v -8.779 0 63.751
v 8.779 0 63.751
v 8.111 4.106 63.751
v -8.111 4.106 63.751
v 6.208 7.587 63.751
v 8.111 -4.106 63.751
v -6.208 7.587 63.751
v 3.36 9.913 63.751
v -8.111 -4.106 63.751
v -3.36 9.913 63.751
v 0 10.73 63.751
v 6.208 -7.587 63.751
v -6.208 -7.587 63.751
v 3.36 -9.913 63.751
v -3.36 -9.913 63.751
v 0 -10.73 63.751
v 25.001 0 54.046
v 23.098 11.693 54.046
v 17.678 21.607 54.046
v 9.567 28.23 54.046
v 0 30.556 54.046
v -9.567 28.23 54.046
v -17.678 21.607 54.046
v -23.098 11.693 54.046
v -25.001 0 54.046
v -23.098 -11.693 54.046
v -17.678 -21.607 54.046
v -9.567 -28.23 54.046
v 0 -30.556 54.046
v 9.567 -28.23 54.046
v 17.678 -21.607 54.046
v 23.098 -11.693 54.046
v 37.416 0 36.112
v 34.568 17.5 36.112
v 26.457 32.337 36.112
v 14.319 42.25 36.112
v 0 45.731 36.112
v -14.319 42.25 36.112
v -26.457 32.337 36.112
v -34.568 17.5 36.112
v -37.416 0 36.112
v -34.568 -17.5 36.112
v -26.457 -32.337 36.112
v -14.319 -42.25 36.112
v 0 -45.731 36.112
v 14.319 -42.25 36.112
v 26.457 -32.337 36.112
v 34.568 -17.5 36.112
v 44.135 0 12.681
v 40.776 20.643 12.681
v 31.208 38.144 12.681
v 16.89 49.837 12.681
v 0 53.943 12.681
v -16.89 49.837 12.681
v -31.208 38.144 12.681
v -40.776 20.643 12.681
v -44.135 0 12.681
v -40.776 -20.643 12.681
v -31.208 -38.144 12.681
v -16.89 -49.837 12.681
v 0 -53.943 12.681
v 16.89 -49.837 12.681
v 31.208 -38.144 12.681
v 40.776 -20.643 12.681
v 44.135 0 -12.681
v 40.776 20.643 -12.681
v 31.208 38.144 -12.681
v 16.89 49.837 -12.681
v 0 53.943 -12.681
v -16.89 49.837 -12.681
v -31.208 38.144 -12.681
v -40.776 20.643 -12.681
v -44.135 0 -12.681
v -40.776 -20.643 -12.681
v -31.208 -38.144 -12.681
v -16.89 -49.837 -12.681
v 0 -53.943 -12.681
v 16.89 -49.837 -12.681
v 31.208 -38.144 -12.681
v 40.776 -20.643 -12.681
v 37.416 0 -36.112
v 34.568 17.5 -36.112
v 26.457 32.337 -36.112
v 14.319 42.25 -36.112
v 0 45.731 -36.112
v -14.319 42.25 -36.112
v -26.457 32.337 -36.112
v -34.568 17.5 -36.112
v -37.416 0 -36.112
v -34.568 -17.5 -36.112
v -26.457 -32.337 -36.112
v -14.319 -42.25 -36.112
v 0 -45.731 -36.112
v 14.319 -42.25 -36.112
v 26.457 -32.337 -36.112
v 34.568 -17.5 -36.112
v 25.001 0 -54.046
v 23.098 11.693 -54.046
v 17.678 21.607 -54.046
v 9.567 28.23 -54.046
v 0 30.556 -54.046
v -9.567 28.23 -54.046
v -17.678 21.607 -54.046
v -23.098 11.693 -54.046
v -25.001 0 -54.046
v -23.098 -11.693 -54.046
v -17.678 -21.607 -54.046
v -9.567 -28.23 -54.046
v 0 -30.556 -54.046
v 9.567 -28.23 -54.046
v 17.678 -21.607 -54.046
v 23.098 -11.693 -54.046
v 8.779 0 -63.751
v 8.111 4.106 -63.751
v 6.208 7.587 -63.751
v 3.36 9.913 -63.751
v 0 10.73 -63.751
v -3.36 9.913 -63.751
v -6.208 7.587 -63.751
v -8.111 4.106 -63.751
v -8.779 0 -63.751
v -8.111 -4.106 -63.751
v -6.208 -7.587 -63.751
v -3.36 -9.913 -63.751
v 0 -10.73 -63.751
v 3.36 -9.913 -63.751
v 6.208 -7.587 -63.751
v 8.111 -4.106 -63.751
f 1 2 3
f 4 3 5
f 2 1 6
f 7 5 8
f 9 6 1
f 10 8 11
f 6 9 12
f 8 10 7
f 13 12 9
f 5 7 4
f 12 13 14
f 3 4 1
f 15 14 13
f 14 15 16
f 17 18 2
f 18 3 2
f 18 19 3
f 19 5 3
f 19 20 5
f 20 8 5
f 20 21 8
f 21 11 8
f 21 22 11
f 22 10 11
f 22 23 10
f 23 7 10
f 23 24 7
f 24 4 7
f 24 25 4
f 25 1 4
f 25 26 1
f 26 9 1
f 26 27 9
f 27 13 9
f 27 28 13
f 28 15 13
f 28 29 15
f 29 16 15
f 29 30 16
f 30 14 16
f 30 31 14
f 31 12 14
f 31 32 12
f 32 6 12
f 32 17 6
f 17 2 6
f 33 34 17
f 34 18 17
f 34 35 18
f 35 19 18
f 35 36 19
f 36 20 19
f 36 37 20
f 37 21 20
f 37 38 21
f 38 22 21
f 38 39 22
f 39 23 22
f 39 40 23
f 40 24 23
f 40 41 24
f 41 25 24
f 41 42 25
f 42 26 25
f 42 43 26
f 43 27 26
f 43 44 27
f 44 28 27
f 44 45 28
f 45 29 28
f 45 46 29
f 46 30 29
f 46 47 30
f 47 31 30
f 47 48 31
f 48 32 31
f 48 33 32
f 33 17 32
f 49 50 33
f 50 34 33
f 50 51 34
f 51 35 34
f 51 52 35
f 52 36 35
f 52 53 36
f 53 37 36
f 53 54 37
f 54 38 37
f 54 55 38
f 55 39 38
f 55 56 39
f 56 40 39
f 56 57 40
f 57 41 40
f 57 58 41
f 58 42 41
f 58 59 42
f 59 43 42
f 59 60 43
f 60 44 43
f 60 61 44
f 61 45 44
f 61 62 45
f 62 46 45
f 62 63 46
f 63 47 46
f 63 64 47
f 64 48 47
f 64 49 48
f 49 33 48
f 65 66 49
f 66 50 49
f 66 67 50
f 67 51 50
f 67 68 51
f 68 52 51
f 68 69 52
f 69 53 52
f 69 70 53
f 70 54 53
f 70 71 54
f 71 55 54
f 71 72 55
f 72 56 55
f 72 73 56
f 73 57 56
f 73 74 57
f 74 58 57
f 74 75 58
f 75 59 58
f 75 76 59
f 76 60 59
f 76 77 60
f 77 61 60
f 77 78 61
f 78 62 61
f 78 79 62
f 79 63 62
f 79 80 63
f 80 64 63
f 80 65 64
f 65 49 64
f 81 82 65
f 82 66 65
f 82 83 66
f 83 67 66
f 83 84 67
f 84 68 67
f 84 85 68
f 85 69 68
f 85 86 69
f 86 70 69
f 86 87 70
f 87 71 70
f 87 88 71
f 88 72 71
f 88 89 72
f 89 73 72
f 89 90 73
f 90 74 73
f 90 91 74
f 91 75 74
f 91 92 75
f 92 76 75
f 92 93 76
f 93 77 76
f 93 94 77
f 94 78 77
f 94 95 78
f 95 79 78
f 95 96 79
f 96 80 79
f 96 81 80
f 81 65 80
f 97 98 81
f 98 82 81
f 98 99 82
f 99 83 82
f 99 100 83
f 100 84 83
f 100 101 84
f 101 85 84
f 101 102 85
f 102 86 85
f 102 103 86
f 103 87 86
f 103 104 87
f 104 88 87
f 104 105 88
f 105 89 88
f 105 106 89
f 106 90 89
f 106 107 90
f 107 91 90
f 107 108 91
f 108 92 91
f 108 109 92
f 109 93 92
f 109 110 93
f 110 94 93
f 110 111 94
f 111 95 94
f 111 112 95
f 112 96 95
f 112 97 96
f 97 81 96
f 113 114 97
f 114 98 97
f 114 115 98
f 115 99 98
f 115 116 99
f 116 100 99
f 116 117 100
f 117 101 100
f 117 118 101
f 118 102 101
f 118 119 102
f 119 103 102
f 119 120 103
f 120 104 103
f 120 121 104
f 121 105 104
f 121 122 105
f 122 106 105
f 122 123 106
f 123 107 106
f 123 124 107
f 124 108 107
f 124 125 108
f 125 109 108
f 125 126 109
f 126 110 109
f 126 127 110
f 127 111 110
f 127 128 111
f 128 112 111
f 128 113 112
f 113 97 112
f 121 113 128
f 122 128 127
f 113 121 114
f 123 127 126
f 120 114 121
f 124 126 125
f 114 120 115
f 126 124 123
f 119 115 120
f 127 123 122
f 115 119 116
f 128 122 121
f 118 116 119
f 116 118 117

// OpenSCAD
// Generated by SolidPython 1.0.1 on 2020-07-29 00:46:48


scale(v = [9, 11, 13]) {
	sphere(r = 5);
}
/***********************************************
*********      SolidPython code:      **********
************************************************
 
# import packages: SolidPython
from solid import *
from solid.utils import *
from itertools import chain, combinations, permutations


class Resize:

    def __init__(self, scad_file):
        self.scad_file = scad_file
        #self.scad_file = import_scad(scad_file)
        # cone/cylinder param:
        self.r1 = 0
        self.r2 = 0
        self.h = 0
        # rectangular prism param:
        self.w = 0
        self.l = 0
        # ellipse param:
        self.r = 0

    # import OpenScad code (file name corresponds to shape)


    # classify shape + parameters
    def assign(self, param1, param2, param3):
        if self.scad_file == 'cone.scad':
            self.r1 = param1
            self.r2 = param2
            self.h = param3
        elif self.scad_file == 'cylinder.scad':
            self.r1 = param1
            self.r2 = param2
            self.h = param3
        elif self.scad_file == 'rectangularPrism.scad':
            self.h = param1
            self.l = param2
            self.w = param3
        else:
            self.r = param1
            self.h = param2

    # resize parameters
    def iterate(self):
        x = range(3, 20, 2)
        i = 1
        if self.scad_file == 'cone.scad':
            tempList = list(permutations(x, 2))
            for temp in tempList:
                param1 = temp[0]
                param2 = temp[1]
                filepath = 'produced_scad_files/' + 'cone' + str(param1) + '_' + str(param2) + '_' + '.scad'
                scad_render_to_file(cylinder(h=param1, r1=param2, r2=0), filepath)

        elif self.scad_file == 'cylinder.scad':
            tempList = list(permutations(x, 3))
            for temp in tempList:
                param1 = temp[0]
                param2 = temp[1]
                filepath = 'produced_scad_files/' + 'cylinder' + str(param1) + '_' + str(param2) + '_' + '.scad'
                scad_render_to_file(cylinder(h=param1, r1=param2, r2=param2), filepath)

        elif self.scad_file == 'rectangularPrism.scad':
            tempList = list(permutations(x, 3))
            for temp in tempList:
                param1 = temp[0]
                param2 = temp[1]
                param3 = temp[2]
                filepath = 'produced_scad_files/' + 'rectangularPrism' + str(param1) + '_' + str(param2) + '_' + str(
                    param3) + '.scad'
                scad_render_to_file(cube(size=(param1, param2, param3)), filepath)

        elif self.scad_file == 'ellipse.scad':
            tempList = list(permutations(x, 4))
            for temp in tempList:
                param1 = temp[0]
                param2 = temp[1]
                param3 = temp[2]
                param4 = temp[3]
                filepath = 'produced_scad_files/' + 'ellipse' + str(param1) + '_' + str(param2) + '_' + str(param3) + '_' + str(param4) + '.scad'
                scad_render_to_file(scale([param1, param2, param3])(sphere(r=param4)), filepath)

    def render_to_scadfile(self):
        scad_render_to_file(scad, 'example.scad') 
 
************************************************/
